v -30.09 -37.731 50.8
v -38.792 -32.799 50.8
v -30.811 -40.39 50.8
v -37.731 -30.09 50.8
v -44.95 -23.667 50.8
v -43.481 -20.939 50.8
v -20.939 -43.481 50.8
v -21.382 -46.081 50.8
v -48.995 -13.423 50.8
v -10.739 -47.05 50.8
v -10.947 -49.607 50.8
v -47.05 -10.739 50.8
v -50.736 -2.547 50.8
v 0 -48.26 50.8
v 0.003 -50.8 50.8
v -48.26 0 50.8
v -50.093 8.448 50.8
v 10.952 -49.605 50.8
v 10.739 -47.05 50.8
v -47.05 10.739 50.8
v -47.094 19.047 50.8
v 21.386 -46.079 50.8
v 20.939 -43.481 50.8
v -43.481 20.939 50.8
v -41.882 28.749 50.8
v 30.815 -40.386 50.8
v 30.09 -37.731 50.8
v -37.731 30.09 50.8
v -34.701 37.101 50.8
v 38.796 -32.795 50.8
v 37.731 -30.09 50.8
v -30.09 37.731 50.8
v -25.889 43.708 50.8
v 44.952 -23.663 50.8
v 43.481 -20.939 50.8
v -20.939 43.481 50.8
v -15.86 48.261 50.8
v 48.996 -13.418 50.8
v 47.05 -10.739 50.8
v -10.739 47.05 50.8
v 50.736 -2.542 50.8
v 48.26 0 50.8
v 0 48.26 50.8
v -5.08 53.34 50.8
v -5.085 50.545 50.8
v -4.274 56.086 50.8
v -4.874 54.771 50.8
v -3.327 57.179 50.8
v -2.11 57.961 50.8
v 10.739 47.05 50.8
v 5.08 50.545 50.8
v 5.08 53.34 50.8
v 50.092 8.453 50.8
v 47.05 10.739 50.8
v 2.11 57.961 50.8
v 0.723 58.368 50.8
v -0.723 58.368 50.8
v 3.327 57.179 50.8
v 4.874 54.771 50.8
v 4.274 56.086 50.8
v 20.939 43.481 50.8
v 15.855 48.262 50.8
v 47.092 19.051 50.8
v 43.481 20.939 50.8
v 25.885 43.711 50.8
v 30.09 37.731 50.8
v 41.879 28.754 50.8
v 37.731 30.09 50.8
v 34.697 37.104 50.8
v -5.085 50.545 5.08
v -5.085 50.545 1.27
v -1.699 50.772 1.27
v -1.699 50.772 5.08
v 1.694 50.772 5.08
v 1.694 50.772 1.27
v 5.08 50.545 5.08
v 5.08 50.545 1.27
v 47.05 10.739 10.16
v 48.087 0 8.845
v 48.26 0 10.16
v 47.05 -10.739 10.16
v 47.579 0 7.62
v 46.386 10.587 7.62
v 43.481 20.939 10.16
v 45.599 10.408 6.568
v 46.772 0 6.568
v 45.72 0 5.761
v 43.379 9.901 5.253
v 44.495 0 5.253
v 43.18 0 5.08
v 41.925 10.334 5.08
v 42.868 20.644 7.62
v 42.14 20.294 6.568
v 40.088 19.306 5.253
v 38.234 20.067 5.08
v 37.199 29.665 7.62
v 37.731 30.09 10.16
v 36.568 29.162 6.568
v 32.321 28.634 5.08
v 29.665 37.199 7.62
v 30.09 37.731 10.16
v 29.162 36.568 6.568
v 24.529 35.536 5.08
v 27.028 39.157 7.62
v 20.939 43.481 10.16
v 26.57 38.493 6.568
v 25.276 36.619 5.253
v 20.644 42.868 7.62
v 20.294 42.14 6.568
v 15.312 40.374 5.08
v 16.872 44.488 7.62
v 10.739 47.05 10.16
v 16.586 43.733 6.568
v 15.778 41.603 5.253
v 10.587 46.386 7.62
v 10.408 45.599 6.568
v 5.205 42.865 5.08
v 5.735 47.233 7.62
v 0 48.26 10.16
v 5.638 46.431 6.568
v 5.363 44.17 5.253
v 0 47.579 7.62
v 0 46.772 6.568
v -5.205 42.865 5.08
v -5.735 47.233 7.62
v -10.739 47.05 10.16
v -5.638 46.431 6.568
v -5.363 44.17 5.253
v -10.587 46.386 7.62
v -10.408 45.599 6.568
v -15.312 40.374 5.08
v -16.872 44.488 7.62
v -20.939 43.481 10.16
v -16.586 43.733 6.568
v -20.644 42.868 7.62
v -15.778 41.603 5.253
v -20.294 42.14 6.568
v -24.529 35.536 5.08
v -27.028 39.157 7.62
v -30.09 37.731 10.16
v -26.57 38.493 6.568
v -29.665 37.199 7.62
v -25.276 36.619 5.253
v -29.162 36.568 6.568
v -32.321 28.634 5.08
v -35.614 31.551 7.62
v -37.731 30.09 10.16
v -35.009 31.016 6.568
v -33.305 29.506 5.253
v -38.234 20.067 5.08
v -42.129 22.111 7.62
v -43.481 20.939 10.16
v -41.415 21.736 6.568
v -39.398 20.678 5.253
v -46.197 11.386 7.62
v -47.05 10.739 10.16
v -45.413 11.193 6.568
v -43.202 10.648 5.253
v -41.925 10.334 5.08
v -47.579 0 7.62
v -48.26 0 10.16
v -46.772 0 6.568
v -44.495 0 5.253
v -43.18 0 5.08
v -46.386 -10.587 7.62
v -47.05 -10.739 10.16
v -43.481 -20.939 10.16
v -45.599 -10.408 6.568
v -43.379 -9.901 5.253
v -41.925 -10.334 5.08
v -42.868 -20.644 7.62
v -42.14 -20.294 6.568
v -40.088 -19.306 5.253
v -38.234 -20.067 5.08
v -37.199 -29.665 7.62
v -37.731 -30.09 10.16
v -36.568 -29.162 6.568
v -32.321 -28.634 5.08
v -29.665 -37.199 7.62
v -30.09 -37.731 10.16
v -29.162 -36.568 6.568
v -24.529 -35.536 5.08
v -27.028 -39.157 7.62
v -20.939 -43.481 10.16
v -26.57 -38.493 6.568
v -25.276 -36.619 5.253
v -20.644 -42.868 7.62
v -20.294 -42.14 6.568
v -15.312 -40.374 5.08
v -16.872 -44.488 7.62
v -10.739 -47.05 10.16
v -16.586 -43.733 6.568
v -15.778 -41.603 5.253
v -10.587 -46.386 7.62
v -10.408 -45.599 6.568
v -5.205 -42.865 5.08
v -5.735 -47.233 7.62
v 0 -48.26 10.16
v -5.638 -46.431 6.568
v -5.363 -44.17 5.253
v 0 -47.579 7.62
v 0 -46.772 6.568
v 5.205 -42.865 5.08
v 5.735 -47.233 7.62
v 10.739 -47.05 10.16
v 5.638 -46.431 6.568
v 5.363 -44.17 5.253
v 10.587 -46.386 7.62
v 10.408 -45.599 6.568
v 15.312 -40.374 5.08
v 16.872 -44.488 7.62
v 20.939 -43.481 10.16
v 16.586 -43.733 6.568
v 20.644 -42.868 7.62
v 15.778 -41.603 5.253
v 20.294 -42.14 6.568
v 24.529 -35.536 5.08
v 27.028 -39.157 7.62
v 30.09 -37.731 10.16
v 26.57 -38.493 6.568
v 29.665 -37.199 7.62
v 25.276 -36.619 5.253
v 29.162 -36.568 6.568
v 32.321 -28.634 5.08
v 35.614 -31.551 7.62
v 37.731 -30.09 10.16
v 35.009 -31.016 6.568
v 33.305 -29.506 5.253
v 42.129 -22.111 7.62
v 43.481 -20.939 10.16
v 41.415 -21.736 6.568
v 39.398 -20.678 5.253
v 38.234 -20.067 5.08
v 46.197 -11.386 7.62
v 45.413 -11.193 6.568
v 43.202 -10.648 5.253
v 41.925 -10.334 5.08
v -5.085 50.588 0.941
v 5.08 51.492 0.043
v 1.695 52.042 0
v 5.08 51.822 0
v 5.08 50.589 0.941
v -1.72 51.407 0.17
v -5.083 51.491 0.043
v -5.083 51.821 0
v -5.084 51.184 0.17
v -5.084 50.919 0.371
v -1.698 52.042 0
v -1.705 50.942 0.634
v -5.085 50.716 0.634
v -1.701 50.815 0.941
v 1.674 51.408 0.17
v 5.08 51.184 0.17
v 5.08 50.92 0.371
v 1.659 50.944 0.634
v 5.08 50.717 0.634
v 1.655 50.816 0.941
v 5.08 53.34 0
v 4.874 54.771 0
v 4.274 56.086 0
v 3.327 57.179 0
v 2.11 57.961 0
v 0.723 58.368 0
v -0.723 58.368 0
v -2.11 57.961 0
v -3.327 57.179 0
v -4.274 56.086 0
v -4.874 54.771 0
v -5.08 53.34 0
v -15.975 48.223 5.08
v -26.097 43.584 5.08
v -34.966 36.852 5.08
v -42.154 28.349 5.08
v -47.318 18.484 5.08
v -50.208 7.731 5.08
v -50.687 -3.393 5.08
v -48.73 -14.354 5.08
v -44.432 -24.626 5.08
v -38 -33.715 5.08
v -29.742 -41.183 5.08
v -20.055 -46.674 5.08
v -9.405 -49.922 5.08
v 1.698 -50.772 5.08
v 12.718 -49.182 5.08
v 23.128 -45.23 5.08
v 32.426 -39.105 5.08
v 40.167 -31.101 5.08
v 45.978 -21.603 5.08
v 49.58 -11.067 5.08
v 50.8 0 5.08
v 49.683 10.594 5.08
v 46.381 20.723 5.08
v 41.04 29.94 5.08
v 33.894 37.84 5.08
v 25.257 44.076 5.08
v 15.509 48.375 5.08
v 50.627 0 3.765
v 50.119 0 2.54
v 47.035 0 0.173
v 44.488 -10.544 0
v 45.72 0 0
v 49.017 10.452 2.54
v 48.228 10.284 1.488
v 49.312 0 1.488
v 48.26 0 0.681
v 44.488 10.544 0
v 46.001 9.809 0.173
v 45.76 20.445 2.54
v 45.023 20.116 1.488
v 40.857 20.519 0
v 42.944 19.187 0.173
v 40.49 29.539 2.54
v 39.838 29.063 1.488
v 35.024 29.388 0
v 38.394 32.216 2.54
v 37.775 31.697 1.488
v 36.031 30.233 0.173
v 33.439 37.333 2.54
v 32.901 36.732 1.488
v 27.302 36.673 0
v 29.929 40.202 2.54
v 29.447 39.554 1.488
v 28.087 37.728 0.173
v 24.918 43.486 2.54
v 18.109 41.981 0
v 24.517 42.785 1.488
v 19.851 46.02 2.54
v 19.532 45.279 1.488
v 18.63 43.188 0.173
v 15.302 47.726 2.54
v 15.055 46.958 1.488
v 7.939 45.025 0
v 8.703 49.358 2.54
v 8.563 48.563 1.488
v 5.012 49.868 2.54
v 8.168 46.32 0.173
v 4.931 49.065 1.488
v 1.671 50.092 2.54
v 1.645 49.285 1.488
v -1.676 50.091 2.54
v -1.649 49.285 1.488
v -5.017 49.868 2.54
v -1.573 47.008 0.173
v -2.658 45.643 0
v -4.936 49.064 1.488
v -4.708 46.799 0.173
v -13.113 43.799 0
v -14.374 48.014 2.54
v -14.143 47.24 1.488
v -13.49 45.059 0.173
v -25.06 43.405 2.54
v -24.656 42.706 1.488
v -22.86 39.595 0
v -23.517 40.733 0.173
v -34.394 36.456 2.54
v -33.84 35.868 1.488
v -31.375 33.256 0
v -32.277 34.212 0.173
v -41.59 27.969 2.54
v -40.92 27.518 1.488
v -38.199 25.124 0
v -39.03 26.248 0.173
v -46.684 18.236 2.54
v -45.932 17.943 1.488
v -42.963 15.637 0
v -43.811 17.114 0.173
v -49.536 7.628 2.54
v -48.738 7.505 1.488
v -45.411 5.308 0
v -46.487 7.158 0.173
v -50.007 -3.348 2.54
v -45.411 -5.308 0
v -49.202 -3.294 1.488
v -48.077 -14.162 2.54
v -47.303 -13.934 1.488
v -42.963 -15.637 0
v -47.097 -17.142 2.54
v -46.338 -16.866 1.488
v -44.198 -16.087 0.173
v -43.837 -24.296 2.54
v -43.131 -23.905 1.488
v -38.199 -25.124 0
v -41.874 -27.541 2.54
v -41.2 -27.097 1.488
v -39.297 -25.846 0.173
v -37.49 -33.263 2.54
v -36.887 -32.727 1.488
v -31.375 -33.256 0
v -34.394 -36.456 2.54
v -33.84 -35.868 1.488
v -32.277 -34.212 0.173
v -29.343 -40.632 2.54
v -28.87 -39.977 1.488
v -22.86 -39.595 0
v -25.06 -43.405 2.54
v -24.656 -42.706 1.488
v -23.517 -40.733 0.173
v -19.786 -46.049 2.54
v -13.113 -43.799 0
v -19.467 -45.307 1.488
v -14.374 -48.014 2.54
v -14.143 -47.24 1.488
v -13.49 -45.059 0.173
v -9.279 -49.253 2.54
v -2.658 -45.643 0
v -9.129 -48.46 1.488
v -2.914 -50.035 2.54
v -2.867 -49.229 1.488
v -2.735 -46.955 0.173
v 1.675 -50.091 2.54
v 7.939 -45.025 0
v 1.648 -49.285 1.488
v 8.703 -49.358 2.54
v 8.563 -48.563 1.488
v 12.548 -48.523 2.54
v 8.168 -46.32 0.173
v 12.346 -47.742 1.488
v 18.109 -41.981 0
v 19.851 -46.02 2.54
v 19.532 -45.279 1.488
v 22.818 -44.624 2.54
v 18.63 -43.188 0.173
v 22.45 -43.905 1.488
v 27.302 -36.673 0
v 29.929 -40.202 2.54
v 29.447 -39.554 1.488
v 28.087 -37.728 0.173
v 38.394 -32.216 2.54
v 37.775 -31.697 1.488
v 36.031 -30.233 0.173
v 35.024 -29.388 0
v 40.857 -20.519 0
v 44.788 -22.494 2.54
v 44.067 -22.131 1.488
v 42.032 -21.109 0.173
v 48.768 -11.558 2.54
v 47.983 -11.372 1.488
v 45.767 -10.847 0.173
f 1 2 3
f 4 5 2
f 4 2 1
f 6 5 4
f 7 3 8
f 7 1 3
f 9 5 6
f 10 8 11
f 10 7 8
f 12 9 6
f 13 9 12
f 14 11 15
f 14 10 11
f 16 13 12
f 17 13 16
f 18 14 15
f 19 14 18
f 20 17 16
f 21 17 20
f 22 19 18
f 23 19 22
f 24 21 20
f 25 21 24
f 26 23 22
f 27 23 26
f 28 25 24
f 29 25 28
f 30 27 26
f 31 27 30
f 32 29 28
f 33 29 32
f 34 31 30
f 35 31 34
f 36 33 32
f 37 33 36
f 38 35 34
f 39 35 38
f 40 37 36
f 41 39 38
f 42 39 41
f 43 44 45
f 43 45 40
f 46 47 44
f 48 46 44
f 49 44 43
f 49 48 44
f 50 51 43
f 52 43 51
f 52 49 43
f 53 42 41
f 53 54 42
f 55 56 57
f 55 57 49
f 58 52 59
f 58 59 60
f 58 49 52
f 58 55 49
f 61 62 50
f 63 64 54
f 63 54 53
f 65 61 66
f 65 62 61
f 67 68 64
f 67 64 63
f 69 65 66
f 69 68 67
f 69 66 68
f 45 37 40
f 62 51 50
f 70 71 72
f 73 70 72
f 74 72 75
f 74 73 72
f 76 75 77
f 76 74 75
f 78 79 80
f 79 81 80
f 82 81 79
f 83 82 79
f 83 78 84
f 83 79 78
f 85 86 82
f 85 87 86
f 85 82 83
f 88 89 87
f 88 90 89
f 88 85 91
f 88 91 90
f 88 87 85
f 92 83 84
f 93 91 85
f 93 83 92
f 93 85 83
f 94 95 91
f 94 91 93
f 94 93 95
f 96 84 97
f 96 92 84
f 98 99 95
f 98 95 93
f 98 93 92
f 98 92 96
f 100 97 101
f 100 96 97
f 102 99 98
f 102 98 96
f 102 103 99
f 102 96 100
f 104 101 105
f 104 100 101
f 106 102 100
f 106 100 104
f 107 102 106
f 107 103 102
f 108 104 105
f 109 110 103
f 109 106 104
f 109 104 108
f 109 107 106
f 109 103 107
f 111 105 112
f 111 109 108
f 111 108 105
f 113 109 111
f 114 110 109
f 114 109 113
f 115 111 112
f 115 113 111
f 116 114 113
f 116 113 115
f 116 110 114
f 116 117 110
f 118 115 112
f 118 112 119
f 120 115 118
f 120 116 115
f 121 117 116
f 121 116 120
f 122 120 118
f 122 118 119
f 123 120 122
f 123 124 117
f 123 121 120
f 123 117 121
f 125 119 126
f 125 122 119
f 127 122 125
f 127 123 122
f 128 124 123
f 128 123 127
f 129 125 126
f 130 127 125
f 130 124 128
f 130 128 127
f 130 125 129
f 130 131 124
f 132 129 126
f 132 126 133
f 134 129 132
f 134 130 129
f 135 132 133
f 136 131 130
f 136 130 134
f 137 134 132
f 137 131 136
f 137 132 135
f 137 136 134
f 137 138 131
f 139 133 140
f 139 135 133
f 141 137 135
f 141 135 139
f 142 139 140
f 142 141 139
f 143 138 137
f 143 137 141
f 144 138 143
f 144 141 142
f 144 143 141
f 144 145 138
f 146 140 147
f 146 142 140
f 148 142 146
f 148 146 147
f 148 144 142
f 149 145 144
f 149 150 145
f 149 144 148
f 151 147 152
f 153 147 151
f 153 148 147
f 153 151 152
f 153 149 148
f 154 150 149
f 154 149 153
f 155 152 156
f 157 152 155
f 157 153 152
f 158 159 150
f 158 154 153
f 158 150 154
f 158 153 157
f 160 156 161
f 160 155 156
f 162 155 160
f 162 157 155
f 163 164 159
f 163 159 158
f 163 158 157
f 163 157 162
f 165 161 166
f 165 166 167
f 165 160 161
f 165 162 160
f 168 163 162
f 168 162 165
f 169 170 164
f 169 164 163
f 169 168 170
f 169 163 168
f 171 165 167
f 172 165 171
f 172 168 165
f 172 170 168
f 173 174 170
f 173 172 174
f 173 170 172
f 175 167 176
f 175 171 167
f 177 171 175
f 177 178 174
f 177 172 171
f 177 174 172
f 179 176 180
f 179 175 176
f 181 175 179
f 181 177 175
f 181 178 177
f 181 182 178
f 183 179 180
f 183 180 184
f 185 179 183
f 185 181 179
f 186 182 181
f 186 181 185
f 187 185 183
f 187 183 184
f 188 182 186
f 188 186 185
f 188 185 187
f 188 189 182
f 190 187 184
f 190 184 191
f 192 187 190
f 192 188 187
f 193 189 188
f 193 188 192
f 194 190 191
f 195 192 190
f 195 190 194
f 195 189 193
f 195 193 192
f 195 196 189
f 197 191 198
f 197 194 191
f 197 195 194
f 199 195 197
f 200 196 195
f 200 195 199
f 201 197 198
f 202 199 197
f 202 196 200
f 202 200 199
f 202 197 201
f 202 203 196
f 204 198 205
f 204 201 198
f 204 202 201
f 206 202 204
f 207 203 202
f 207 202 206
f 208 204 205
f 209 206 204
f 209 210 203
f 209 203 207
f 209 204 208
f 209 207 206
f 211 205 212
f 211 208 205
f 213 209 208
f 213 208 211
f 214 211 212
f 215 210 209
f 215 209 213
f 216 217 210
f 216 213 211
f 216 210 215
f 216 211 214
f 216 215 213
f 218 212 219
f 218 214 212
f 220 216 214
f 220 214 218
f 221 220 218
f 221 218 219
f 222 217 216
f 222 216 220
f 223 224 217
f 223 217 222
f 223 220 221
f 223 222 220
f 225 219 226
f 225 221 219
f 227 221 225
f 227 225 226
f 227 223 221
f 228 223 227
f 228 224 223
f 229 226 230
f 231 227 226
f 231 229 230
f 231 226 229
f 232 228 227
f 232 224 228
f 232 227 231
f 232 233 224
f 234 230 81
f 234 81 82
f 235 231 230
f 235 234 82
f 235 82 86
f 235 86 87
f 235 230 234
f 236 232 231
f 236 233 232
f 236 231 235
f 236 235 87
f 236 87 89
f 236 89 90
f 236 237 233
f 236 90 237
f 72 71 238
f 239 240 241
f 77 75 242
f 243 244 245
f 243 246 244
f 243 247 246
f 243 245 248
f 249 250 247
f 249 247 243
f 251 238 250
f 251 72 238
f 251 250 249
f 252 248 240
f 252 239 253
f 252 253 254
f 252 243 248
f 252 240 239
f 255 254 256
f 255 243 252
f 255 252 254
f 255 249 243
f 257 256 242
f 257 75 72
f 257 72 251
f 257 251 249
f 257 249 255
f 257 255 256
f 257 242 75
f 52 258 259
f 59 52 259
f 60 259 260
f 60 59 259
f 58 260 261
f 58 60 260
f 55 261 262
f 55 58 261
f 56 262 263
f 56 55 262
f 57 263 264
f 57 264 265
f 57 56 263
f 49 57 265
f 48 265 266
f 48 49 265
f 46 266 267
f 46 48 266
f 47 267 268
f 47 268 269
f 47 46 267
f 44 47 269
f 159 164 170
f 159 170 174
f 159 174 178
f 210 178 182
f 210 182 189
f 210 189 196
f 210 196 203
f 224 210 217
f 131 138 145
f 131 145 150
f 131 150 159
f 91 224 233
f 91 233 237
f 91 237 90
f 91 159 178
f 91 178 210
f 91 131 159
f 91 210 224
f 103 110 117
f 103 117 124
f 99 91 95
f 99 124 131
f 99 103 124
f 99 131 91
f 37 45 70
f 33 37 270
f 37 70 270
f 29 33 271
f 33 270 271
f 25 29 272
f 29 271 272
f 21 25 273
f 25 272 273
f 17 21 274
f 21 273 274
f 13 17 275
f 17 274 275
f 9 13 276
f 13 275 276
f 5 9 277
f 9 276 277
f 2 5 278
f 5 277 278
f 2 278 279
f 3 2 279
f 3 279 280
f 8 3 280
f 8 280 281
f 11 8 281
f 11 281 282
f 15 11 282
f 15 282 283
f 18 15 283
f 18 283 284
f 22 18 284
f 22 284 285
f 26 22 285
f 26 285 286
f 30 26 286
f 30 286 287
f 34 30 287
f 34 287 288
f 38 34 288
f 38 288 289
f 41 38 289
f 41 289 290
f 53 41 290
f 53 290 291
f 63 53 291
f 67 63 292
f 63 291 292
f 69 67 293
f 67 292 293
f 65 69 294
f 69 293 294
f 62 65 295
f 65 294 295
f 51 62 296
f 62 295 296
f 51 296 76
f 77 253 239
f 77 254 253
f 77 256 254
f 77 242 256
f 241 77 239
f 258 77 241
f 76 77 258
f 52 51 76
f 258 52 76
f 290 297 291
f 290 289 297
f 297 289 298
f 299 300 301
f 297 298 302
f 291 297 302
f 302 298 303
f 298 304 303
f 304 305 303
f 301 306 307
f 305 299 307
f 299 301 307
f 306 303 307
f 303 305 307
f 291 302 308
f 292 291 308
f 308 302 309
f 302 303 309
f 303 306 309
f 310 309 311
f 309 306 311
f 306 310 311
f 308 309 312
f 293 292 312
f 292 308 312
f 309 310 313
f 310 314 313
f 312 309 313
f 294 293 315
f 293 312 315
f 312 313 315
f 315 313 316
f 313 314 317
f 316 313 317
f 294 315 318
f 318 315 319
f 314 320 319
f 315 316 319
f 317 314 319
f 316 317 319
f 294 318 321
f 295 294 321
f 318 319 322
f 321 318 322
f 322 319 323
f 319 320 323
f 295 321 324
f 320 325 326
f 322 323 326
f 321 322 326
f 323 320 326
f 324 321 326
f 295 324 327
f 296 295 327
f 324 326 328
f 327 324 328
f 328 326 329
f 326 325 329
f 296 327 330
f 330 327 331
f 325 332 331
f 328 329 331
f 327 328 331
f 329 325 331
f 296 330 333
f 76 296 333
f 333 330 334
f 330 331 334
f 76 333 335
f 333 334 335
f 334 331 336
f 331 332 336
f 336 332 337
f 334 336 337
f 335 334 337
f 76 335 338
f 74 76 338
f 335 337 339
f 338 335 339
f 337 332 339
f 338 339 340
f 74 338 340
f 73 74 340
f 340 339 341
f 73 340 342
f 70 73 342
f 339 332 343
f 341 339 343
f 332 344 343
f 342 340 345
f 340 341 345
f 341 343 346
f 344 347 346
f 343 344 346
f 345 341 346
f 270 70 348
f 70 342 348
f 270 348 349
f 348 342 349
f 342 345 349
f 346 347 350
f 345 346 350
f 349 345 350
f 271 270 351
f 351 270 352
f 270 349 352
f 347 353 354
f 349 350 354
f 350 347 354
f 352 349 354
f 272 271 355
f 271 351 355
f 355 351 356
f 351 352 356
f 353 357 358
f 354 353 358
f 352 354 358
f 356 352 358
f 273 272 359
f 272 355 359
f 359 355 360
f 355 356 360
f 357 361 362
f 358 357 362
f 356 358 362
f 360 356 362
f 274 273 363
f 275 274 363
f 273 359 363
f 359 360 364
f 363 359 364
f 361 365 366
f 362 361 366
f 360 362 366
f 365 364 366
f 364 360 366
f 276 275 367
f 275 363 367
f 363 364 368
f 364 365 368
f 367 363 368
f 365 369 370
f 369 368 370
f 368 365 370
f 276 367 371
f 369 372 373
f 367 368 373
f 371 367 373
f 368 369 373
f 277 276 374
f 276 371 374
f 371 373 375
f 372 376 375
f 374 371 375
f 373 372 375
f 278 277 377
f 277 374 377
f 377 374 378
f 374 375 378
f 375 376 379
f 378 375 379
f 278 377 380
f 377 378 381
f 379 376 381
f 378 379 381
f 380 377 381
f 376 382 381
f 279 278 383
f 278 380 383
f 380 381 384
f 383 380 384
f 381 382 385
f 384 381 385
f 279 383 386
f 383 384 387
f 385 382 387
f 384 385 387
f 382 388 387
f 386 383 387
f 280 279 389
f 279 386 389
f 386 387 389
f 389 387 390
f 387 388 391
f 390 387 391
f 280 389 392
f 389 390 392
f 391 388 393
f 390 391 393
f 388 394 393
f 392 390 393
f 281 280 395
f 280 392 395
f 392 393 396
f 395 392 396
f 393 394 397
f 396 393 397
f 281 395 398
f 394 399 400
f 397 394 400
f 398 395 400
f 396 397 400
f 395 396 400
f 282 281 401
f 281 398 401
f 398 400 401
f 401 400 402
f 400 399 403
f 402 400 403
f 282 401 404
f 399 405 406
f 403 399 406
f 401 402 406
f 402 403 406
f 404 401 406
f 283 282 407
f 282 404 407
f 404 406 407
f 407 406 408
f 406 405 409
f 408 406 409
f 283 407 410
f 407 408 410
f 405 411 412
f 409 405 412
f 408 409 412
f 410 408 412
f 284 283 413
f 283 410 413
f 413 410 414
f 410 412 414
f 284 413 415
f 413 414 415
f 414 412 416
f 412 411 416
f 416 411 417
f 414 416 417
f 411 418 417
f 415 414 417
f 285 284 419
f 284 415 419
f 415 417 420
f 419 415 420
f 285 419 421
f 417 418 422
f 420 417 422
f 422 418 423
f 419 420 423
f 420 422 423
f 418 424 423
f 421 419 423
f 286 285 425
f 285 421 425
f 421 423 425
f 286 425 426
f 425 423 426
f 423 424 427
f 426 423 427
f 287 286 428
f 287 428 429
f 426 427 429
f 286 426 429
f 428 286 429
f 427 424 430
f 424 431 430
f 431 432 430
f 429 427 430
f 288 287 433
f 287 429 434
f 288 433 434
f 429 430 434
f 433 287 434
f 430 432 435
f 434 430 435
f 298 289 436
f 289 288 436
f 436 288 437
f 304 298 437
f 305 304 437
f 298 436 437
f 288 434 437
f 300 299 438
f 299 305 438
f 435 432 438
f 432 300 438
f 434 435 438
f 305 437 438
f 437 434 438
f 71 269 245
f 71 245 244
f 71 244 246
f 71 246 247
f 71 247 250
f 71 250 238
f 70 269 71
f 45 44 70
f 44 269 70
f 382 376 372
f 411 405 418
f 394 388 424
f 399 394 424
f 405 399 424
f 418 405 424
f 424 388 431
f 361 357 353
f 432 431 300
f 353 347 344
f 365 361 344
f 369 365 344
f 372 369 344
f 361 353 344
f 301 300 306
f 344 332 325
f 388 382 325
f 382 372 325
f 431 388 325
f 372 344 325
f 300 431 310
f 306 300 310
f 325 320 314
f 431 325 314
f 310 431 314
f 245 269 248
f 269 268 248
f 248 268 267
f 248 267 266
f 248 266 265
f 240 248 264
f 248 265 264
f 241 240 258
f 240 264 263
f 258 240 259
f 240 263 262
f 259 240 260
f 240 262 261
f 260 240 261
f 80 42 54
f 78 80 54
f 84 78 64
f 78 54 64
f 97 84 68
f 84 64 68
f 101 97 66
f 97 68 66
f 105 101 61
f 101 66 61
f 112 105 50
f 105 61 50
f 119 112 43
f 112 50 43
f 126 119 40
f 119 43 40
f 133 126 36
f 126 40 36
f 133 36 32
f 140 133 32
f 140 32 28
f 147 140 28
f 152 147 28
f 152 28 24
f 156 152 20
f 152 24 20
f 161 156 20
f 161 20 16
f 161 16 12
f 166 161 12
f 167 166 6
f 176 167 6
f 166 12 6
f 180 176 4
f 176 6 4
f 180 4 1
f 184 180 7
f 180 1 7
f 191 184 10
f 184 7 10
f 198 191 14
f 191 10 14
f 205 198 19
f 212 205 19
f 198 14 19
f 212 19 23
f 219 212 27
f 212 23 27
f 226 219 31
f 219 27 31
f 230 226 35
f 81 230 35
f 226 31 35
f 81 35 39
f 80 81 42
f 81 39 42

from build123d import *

# Parameters (mm, degrees)
F0_R     = 50.8
F1_DEPTH = 50.8
F2_R     = 48.26
F3_DEPTH = 45.72
F4_R     = 5.08
F5_R     = 5.08
F7_DEPTH = 50.8
F8_R     = 1.27


# Not quite as in the source:
# - the program builds the solid bodies; features that only make, move or delete a surface that nothing else refers to are left out


with BuildPart() as f1:
    # F0 (on Top) → F1 (new body)
    with BuildSketch(Plane.XY):
        Circle(F0_R)
    extrude(amount=F1_DEPTH)

    # F2 (on face) → F3 (cut)
    with BuildSketch(Plane.XY.offset(50.8)):
        Circle(F2_R)
    extrude(amount=-F3_DEPTH, mode=Mode.SUBTRACT)

    # F4
    f4_edges = [f1.edges().sort_by_distance(p)[0] for p in [
        (-48.26, 0, 5.08),
    ]]
    fillet(f4_edges, radius=F4_R)

    # F5
    f5_edges = [f1.edges().sort_by_distance(p)[0] for p in [
        (-50.8, 0, 0),
    ]]
    fillet(f5_edges, radius=F5_R)

    # F6 (on face) → F7 (join)
    with BuildSketch(Plane.XY.offset(50.8)):
        with BuildLine():
            ThreePointArc((5.08, 53.34), (0, 58.42), (-5.08, 53.34))
            Line((-5.08, 53.34), (-5.0849799889, 50.5448610495))
            ThreePointArc((-5.0849799889, 50.5448610495), (-0.002502551, 50.7999999384), (5.08, 50.545361805))
            Line((5.08, 50.545361805), (5.08, 50.8))
            Line((5.08, 50.8), (5.08, 53.34))
        make_face()
    extrude(amount=-F7_DEPTH)

    # F8
    f8_edges = [f1.edges().sort_by_distance(p)[0] for p in [
        (-0.002503, 50.8, 0),
    ]]
    fillet(f8_edges, radius=F8_R)


solid = f1.part
